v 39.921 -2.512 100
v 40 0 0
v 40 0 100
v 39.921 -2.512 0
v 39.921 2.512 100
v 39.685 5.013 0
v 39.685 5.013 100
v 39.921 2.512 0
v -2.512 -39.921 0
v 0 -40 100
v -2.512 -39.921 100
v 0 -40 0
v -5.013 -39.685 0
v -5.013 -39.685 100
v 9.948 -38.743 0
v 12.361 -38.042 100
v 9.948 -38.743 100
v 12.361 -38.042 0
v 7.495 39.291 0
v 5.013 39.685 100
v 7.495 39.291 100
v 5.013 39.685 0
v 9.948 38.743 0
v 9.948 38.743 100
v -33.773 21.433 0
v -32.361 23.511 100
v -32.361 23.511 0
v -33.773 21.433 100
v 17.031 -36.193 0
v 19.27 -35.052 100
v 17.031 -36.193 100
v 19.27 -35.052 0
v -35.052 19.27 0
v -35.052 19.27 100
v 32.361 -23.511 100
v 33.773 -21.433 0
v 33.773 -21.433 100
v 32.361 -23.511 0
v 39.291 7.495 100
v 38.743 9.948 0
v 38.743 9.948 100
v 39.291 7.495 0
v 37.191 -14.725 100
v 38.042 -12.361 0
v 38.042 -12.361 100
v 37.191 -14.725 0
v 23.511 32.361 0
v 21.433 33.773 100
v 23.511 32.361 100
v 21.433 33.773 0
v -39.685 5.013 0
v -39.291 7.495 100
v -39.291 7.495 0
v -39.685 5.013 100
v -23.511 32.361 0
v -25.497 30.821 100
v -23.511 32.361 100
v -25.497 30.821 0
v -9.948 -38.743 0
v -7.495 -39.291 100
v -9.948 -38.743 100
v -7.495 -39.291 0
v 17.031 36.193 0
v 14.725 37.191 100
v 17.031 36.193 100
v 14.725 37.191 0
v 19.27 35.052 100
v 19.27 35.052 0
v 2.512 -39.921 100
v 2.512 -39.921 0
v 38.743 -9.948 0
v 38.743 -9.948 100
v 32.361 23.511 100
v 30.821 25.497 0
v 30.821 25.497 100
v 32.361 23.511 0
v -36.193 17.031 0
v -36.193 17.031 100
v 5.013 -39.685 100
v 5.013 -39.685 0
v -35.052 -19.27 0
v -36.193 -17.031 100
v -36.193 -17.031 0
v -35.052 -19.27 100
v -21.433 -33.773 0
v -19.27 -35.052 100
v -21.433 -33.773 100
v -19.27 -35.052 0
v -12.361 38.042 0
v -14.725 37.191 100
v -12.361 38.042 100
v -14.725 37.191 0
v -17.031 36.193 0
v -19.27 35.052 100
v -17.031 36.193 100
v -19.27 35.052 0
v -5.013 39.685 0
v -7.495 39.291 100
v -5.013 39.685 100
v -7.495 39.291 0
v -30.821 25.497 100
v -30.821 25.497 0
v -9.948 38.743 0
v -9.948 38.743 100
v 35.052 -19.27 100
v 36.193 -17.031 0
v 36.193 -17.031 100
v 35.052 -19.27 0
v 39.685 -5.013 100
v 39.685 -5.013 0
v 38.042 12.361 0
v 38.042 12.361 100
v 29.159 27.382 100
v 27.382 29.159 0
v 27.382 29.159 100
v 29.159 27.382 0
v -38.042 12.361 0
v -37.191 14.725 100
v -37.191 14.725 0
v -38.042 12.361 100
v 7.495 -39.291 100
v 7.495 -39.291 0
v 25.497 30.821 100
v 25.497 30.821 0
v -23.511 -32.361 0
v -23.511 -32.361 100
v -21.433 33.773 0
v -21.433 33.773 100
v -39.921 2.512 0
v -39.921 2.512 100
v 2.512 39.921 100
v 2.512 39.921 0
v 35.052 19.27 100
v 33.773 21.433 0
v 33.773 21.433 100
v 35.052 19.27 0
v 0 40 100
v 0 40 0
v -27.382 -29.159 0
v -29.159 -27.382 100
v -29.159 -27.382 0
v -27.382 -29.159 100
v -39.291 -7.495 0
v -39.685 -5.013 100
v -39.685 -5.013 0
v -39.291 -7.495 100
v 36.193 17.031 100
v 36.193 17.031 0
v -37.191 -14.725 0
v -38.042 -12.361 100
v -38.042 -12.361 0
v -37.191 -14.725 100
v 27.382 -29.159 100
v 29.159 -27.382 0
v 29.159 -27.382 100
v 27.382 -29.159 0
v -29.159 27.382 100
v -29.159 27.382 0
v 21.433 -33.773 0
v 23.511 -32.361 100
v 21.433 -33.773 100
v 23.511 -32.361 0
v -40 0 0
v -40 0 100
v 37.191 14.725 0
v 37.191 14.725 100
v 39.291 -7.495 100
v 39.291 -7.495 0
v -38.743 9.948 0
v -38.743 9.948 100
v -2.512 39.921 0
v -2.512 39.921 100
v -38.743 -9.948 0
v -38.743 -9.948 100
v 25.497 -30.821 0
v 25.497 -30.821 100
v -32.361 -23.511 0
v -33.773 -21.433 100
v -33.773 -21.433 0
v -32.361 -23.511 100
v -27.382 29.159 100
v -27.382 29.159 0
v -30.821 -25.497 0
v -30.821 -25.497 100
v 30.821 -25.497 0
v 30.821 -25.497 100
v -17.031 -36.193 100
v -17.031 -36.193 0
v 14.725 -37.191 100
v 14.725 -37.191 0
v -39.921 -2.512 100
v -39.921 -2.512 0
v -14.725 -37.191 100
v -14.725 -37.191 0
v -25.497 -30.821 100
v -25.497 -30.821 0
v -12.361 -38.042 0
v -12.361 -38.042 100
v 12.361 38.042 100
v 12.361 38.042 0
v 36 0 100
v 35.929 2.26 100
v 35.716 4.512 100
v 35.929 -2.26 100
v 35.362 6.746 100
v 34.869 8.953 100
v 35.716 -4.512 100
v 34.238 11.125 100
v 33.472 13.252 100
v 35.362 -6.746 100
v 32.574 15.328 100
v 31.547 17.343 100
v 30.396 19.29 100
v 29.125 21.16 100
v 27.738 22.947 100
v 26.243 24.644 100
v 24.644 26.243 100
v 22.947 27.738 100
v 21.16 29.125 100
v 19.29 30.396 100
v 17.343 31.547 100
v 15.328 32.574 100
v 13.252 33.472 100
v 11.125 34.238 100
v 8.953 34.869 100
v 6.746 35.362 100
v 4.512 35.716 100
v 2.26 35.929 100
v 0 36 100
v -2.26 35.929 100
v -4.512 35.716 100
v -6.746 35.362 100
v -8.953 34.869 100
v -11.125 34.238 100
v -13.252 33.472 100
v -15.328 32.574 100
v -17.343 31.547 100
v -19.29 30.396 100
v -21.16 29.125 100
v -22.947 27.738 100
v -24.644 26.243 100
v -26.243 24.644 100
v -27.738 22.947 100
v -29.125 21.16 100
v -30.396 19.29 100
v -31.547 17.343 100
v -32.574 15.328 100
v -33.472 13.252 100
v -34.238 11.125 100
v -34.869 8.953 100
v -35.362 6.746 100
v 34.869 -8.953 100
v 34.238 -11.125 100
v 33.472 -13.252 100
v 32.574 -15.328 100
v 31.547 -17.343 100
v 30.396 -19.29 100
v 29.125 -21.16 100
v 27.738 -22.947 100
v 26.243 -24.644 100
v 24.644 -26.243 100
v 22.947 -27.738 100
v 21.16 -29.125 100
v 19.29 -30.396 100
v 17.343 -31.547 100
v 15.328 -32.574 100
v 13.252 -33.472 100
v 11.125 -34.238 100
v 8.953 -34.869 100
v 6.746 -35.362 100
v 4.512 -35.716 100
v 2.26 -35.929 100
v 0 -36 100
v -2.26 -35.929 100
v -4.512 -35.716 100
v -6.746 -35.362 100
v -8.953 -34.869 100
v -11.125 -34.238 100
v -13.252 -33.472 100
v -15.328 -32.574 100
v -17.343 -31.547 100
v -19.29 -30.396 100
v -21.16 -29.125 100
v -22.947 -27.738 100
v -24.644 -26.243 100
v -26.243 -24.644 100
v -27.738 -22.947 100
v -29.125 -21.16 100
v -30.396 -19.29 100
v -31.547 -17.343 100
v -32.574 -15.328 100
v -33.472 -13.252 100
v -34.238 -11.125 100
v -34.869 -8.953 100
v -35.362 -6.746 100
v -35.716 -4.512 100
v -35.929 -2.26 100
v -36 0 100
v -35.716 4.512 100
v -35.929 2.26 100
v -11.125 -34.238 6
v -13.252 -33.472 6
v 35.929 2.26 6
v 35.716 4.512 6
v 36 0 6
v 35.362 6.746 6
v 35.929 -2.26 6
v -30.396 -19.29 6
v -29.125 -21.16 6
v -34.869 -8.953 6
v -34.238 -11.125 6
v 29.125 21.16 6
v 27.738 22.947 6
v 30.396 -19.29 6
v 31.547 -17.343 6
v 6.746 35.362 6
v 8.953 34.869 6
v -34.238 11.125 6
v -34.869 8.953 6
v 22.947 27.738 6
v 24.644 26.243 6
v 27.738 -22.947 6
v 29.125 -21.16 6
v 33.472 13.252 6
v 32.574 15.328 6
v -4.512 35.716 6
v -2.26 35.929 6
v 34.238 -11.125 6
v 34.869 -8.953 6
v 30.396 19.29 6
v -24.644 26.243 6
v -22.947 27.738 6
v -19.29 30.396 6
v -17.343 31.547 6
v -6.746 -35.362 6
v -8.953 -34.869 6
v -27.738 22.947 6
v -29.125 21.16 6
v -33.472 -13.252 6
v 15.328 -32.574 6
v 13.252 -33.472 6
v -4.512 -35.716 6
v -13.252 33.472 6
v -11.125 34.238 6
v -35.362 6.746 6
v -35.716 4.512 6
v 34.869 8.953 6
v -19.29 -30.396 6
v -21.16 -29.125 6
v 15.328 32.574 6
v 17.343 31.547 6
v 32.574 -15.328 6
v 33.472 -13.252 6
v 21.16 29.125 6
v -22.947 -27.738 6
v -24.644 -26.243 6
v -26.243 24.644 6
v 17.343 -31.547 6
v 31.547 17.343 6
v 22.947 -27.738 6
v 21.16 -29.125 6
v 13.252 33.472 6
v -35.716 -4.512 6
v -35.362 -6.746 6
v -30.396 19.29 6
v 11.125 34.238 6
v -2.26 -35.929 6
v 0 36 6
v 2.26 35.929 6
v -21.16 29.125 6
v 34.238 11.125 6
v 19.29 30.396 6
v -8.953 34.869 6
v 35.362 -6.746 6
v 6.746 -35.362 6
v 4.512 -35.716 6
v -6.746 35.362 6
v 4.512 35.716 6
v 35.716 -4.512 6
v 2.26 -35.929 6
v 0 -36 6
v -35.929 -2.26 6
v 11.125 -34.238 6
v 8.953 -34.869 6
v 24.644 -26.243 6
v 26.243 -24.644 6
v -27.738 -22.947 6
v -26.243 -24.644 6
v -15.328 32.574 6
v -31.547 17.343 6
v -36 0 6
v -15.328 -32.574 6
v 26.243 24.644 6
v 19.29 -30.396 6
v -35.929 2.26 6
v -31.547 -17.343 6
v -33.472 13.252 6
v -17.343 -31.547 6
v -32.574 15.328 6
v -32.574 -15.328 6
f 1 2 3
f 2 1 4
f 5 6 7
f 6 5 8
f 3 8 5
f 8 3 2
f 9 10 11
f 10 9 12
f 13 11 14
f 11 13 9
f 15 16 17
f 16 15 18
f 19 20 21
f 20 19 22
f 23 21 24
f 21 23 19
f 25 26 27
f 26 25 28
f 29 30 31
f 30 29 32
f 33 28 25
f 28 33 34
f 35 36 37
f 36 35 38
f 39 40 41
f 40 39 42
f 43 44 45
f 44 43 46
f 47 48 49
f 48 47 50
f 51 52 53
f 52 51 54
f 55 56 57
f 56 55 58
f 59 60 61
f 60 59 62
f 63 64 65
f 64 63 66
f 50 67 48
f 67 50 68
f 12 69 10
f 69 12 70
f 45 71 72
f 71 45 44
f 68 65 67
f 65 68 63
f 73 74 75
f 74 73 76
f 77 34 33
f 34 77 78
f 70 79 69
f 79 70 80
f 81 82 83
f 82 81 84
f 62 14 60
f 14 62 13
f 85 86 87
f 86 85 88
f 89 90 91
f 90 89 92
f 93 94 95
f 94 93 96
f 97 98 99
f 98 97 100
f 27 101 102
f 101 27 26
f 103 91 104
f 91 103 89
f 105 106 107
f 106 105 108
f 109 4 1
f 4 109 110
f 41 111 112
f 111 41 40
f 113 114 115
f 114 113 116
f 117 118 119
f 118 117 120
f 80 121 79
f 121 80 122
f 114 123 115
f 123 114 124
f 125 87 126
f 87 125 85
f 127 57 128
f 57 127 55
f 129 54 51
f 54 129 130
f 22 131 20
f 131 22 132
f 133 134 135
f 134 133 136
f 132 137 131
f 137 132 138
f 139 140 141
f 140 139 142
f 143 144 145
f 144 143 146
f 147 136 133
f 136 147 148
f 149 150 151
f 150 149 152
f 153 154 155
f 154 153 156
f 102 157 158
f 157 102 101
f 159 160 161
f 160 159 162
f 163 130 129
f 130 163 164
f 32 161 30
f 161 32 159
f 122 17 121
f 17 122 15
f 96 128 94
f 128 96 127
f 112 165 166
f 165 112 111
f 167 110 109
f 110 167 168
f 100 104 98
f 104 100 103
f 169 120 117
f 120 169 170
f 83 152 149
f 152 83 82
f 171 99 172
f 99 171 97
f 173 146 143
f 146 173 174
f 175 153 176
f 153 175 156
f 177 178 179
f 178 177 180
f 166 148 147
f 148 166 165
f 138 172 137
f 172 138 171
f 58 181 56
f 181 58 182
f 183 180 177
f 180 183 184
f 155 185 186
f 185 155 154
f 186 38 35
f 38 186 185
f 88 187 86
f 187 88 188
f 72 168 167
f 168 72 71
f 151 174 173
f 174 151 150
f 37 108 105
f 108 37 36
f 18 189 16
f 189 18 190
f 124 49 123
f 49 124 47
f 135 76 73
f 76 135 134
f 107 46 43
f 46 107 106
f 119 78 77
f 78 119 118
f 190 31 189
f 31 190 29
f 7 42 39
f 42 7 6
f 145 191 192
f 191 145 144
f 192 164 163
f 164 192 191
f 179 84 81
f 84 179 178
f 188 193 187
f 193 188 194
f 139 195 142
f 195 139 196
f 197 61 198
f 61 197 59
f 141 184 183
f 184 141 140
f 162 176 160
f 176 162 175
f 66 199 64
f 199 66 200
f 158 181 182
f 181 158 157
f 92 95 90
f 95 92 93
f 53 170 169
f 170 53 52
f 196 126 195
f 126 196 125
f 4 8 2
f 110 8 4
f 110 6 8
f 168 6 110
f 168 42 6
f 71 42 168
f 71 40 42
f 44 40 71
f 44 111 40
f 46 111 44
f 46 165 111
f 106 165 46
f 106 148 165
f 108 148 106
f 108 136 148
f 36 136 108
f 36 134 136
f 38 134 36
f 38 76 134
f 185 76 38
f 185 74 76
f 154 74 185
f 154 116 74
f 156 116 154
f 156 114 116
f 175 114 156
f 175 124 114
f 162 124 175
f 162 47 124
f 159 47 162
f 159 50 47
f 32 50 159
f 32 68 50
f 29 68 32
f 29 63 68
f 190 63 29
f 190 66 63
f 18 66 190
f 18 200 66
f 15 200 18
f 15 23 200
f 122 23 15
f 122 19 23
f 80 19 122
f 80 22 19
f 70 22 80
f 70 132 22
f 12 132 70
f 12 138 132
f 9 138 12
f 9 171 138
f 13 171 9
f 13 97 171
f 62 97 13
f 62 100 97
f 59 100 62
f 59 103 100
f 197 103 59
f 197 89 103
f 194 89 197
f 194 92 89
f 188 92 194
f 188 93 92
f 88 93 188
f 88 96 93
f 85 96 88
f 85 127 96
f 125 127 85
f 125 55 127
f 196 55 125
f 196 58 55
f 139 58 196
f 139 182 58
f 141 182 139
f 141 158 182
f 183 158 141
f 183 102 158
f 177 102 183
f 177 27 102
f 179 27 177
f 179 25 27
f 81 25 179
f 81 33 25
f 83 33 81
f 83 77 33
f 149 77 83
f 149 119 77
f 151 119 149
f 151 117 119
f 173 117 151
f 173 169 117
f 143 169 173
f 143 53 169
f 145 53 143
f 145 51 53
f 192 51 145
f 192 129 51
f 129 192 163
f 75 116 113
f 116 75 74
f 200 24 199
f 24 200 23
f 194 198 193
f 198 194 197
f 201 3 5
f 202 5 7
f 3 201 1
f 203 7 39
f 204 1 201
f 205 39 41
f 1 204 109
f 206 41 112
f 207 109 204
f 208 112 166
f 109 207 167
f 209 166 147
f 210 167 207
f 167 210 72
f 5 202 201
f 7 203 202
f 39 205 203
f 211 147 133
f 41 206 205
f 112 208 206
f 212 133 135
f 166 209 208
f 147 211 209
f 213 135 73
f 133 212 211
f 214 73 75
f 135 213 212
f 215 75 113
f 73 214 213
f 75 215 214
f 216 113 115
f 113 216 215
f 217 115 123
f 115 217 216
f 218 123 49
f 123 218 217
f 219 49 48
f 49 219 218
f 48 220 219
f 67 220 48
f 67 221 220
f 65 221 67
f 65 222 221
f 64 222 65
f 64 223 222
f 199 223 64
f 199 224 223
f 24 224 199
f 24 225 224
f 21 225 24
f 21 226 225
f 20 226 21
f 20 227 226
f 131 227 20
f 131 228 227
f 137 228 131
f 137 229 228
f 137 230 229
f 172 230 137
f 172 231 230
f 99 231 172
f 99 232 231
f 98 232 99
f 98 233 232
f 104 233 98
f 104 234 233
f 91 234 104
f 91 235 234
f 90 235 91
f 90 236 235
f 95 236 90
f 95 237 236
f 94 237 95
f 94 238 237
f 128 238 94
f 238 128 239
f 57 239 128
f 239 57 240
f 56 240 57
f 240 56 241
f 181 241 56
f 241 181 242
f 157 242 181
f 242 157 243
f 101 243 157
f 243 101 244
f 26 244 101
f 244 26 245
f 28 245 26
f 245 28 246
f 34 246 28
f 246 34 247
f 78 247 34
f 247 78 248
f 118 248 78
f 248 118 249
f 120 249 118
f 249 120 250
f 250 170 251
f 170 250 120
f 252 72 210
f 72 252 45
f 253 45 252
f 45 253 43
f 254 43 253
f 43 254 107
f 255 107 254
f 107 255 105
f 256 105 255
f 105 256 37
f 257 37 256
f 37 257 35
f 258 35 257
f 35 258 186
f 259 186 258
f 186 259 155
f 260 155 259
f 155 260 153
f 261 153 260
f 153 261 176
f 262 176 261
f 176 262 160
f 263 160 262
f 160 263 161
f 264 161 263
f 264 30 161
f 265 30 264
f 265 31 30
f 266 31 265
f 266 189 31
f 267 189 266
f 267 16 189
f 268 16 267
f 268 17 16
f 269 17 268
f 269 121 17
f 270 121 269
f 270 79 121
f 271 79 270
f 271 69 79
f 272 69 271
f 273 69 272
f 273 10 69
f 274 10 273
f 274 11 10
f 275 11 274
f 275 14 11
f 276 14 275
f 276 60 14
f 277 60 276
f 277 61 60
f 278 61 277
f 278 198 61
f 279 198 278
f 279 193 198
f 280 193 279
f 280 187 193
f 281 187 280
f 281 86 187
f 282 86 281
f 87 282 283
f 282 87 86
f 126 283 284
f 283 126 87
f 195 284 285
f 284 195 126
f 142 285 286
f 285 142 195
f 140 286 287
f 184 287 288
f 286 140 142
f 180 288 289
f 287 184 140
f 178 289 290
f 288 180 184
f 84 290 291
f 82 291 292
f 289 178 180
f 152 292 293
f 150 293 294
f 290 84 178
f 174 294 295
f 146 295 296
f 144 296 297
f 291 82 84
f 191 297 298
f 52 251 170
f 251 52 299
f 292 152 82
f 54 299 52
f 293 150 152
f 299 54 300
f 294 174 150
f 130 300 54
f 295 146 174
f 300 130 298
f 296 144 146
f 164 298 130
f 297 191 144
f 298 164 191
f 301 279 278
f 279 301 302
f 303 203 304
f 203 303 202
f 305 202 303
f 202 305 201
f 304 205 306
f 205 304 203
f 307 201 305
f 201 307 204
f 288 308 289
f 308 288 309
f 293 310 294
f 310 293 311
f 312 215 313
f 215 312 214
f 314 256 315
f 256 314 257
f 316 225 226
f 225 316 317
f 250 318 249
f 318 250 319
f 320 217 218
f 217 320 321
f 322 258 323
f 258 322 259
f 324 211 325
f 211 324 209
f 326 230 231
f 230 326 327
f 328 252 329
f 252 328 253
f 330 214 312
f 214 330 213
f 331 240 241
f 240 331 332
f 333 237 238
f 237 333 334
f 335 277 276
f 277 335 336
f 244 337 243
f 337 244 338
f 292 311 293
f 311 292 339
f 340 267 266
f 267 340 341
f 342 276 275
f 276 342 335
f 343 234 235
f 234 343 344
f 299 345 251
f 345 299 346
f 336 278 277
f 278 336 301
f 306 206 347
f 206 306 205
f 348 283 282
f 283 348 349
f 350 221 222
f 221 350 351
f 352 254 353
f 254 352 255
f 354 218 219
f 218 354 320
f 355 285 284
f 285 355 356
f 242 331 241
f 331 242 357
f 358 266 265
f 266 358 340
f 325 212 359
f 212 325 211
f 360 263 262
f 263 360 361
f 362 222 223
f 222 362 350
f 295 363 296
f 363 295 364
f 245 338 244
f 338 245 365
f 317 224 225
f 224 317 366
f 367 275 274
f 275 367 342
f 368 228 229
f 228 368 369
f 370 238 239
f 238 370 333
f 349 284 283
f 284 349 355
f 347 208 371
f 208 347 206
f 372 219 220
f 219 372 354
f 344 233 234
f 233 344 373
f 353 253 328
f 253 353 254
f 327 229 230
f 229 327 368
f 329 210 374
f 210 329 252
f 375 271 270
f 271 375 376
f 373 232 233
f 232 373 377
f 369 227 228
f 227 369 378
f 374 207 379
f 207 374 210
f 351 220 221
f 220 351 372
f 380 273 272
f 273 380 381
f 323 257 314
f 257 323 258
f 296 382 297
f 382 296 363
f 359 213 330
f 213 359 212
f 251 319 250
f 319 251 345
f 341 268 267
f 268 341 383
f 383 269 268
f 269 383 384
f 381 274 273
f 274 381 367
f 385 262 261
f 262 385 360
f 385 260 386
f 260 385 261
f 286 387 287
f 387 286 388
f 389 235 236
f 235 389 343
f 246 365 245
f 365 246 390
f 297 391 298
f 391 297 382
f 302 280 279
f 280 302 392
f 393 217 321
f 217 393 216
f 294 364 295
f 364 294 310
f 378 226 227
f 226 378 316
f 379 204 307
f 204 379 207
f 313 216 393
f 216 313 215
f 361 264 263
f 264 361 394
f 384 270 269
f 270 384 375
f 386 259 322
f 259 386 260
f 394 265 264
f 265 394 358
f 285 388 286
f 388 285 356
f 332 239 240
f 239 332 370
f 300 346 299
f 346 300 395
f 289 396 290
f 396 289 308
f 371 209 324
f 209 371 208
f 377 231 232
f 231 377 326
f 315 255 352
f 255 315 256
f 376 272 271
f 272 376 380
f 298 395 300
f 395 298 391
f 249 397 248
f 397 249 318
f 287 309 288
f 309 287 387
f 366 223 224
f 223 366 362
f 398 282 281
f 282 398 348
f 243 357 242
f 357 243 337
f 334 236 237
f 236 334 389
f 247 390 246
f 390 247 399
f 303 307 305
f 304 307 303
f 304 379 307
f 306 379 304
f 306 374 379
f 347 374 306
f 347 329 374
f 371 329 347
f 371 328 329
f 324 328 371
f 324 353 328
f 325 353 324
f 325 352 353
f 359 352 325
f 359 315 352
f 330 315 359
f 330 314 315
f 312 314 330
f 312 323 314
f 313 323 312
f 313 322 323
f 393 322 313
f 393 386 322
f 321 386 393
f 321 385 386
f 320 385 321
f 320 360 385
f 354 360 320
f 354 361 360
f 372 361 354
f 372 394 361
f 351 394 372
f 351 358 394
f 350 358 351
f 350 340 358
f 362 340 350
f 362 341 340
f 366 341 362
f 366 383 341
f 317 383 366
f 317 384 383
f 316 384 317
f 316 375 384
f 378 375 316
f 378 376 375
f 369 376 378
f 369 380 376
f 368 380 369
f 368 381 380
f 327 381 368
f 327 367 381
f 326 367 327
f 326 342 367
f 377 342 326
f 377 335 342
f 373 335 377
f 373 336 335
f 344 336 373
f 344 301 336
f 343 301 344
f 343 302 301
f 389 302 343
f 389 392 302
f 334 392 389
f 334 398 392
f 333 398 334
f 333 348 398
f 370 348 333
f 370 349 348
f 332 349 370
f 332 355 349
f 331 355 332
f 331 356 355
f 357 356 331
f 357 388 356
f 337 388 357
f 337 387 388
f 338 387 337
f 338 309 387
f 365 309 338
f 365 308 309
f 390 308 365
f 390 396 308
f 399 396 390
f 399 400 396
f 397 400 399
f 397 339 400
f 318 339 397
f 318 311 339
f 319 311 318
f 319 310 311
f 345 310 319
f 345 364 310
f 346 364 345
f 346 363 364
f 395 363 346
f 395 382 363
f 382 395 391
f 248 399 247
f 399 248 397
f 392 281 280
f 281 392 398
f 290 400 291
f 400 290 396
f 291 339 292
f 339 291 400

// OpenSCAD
$fn = 100; // 滑らかさを向上

// パラメータ
outer_diameter = 80;
height = 100;
wall_thickness = 4;
bottom_thickness = 6;

// 取っ手の設計
// 課題の「外径方向に飛び出す半径 12mm」を厳守します。
// カップの半径は 40mm なので、取手の外側の端は 40 + 12 = 52mm になります。
handle_protrusion = 12; 
// 指を通すための空間を確保するため、取手の肉厚を調整します。
// 取っ手の中心位置を計算：
// 外側の端(52mm) - 取っ手の半径(r) = 中心位置
// 内側の端(40mm + 隙間) + 取っ手の半径(r) = 中心位置
// 隙間を 4mm とすると、取手の半径は (52 - 44) / 2 = 4mm となります。
handle_tube_radius = 4;
handle_major_r = (outer_diameter / 2) + handle_protrusion - handle_tube_radius;

// 内寸の計算
inner_diameter = outer_diameter - (2 * wall_thickness);
inner_height = height - bottom_thickness;

union() {
    // マグカップ本体
    difference() {
        // 外側の円柱
        cylinder(d = outer_diameter, h = height);
        
        // 内側の空間（底面をくり抜く）
        translate([0, 0, bottom_thickness])
            cylinder(d = inner_diameter, h = inner_height + 1);
    }

    // 取っ手 (リング状)
    // rotate_extrude を使用してドーナツ状の形状を作成
    // 中心高さ (height / 2) に配置
    translate([handle_major_r, 0, height / 2])
    rotate([0, 90, 0])
    rotate_extrude()
    translate([handle_tube_radius, 0, 0])
    circle(r = handle_tube_radius);
}
